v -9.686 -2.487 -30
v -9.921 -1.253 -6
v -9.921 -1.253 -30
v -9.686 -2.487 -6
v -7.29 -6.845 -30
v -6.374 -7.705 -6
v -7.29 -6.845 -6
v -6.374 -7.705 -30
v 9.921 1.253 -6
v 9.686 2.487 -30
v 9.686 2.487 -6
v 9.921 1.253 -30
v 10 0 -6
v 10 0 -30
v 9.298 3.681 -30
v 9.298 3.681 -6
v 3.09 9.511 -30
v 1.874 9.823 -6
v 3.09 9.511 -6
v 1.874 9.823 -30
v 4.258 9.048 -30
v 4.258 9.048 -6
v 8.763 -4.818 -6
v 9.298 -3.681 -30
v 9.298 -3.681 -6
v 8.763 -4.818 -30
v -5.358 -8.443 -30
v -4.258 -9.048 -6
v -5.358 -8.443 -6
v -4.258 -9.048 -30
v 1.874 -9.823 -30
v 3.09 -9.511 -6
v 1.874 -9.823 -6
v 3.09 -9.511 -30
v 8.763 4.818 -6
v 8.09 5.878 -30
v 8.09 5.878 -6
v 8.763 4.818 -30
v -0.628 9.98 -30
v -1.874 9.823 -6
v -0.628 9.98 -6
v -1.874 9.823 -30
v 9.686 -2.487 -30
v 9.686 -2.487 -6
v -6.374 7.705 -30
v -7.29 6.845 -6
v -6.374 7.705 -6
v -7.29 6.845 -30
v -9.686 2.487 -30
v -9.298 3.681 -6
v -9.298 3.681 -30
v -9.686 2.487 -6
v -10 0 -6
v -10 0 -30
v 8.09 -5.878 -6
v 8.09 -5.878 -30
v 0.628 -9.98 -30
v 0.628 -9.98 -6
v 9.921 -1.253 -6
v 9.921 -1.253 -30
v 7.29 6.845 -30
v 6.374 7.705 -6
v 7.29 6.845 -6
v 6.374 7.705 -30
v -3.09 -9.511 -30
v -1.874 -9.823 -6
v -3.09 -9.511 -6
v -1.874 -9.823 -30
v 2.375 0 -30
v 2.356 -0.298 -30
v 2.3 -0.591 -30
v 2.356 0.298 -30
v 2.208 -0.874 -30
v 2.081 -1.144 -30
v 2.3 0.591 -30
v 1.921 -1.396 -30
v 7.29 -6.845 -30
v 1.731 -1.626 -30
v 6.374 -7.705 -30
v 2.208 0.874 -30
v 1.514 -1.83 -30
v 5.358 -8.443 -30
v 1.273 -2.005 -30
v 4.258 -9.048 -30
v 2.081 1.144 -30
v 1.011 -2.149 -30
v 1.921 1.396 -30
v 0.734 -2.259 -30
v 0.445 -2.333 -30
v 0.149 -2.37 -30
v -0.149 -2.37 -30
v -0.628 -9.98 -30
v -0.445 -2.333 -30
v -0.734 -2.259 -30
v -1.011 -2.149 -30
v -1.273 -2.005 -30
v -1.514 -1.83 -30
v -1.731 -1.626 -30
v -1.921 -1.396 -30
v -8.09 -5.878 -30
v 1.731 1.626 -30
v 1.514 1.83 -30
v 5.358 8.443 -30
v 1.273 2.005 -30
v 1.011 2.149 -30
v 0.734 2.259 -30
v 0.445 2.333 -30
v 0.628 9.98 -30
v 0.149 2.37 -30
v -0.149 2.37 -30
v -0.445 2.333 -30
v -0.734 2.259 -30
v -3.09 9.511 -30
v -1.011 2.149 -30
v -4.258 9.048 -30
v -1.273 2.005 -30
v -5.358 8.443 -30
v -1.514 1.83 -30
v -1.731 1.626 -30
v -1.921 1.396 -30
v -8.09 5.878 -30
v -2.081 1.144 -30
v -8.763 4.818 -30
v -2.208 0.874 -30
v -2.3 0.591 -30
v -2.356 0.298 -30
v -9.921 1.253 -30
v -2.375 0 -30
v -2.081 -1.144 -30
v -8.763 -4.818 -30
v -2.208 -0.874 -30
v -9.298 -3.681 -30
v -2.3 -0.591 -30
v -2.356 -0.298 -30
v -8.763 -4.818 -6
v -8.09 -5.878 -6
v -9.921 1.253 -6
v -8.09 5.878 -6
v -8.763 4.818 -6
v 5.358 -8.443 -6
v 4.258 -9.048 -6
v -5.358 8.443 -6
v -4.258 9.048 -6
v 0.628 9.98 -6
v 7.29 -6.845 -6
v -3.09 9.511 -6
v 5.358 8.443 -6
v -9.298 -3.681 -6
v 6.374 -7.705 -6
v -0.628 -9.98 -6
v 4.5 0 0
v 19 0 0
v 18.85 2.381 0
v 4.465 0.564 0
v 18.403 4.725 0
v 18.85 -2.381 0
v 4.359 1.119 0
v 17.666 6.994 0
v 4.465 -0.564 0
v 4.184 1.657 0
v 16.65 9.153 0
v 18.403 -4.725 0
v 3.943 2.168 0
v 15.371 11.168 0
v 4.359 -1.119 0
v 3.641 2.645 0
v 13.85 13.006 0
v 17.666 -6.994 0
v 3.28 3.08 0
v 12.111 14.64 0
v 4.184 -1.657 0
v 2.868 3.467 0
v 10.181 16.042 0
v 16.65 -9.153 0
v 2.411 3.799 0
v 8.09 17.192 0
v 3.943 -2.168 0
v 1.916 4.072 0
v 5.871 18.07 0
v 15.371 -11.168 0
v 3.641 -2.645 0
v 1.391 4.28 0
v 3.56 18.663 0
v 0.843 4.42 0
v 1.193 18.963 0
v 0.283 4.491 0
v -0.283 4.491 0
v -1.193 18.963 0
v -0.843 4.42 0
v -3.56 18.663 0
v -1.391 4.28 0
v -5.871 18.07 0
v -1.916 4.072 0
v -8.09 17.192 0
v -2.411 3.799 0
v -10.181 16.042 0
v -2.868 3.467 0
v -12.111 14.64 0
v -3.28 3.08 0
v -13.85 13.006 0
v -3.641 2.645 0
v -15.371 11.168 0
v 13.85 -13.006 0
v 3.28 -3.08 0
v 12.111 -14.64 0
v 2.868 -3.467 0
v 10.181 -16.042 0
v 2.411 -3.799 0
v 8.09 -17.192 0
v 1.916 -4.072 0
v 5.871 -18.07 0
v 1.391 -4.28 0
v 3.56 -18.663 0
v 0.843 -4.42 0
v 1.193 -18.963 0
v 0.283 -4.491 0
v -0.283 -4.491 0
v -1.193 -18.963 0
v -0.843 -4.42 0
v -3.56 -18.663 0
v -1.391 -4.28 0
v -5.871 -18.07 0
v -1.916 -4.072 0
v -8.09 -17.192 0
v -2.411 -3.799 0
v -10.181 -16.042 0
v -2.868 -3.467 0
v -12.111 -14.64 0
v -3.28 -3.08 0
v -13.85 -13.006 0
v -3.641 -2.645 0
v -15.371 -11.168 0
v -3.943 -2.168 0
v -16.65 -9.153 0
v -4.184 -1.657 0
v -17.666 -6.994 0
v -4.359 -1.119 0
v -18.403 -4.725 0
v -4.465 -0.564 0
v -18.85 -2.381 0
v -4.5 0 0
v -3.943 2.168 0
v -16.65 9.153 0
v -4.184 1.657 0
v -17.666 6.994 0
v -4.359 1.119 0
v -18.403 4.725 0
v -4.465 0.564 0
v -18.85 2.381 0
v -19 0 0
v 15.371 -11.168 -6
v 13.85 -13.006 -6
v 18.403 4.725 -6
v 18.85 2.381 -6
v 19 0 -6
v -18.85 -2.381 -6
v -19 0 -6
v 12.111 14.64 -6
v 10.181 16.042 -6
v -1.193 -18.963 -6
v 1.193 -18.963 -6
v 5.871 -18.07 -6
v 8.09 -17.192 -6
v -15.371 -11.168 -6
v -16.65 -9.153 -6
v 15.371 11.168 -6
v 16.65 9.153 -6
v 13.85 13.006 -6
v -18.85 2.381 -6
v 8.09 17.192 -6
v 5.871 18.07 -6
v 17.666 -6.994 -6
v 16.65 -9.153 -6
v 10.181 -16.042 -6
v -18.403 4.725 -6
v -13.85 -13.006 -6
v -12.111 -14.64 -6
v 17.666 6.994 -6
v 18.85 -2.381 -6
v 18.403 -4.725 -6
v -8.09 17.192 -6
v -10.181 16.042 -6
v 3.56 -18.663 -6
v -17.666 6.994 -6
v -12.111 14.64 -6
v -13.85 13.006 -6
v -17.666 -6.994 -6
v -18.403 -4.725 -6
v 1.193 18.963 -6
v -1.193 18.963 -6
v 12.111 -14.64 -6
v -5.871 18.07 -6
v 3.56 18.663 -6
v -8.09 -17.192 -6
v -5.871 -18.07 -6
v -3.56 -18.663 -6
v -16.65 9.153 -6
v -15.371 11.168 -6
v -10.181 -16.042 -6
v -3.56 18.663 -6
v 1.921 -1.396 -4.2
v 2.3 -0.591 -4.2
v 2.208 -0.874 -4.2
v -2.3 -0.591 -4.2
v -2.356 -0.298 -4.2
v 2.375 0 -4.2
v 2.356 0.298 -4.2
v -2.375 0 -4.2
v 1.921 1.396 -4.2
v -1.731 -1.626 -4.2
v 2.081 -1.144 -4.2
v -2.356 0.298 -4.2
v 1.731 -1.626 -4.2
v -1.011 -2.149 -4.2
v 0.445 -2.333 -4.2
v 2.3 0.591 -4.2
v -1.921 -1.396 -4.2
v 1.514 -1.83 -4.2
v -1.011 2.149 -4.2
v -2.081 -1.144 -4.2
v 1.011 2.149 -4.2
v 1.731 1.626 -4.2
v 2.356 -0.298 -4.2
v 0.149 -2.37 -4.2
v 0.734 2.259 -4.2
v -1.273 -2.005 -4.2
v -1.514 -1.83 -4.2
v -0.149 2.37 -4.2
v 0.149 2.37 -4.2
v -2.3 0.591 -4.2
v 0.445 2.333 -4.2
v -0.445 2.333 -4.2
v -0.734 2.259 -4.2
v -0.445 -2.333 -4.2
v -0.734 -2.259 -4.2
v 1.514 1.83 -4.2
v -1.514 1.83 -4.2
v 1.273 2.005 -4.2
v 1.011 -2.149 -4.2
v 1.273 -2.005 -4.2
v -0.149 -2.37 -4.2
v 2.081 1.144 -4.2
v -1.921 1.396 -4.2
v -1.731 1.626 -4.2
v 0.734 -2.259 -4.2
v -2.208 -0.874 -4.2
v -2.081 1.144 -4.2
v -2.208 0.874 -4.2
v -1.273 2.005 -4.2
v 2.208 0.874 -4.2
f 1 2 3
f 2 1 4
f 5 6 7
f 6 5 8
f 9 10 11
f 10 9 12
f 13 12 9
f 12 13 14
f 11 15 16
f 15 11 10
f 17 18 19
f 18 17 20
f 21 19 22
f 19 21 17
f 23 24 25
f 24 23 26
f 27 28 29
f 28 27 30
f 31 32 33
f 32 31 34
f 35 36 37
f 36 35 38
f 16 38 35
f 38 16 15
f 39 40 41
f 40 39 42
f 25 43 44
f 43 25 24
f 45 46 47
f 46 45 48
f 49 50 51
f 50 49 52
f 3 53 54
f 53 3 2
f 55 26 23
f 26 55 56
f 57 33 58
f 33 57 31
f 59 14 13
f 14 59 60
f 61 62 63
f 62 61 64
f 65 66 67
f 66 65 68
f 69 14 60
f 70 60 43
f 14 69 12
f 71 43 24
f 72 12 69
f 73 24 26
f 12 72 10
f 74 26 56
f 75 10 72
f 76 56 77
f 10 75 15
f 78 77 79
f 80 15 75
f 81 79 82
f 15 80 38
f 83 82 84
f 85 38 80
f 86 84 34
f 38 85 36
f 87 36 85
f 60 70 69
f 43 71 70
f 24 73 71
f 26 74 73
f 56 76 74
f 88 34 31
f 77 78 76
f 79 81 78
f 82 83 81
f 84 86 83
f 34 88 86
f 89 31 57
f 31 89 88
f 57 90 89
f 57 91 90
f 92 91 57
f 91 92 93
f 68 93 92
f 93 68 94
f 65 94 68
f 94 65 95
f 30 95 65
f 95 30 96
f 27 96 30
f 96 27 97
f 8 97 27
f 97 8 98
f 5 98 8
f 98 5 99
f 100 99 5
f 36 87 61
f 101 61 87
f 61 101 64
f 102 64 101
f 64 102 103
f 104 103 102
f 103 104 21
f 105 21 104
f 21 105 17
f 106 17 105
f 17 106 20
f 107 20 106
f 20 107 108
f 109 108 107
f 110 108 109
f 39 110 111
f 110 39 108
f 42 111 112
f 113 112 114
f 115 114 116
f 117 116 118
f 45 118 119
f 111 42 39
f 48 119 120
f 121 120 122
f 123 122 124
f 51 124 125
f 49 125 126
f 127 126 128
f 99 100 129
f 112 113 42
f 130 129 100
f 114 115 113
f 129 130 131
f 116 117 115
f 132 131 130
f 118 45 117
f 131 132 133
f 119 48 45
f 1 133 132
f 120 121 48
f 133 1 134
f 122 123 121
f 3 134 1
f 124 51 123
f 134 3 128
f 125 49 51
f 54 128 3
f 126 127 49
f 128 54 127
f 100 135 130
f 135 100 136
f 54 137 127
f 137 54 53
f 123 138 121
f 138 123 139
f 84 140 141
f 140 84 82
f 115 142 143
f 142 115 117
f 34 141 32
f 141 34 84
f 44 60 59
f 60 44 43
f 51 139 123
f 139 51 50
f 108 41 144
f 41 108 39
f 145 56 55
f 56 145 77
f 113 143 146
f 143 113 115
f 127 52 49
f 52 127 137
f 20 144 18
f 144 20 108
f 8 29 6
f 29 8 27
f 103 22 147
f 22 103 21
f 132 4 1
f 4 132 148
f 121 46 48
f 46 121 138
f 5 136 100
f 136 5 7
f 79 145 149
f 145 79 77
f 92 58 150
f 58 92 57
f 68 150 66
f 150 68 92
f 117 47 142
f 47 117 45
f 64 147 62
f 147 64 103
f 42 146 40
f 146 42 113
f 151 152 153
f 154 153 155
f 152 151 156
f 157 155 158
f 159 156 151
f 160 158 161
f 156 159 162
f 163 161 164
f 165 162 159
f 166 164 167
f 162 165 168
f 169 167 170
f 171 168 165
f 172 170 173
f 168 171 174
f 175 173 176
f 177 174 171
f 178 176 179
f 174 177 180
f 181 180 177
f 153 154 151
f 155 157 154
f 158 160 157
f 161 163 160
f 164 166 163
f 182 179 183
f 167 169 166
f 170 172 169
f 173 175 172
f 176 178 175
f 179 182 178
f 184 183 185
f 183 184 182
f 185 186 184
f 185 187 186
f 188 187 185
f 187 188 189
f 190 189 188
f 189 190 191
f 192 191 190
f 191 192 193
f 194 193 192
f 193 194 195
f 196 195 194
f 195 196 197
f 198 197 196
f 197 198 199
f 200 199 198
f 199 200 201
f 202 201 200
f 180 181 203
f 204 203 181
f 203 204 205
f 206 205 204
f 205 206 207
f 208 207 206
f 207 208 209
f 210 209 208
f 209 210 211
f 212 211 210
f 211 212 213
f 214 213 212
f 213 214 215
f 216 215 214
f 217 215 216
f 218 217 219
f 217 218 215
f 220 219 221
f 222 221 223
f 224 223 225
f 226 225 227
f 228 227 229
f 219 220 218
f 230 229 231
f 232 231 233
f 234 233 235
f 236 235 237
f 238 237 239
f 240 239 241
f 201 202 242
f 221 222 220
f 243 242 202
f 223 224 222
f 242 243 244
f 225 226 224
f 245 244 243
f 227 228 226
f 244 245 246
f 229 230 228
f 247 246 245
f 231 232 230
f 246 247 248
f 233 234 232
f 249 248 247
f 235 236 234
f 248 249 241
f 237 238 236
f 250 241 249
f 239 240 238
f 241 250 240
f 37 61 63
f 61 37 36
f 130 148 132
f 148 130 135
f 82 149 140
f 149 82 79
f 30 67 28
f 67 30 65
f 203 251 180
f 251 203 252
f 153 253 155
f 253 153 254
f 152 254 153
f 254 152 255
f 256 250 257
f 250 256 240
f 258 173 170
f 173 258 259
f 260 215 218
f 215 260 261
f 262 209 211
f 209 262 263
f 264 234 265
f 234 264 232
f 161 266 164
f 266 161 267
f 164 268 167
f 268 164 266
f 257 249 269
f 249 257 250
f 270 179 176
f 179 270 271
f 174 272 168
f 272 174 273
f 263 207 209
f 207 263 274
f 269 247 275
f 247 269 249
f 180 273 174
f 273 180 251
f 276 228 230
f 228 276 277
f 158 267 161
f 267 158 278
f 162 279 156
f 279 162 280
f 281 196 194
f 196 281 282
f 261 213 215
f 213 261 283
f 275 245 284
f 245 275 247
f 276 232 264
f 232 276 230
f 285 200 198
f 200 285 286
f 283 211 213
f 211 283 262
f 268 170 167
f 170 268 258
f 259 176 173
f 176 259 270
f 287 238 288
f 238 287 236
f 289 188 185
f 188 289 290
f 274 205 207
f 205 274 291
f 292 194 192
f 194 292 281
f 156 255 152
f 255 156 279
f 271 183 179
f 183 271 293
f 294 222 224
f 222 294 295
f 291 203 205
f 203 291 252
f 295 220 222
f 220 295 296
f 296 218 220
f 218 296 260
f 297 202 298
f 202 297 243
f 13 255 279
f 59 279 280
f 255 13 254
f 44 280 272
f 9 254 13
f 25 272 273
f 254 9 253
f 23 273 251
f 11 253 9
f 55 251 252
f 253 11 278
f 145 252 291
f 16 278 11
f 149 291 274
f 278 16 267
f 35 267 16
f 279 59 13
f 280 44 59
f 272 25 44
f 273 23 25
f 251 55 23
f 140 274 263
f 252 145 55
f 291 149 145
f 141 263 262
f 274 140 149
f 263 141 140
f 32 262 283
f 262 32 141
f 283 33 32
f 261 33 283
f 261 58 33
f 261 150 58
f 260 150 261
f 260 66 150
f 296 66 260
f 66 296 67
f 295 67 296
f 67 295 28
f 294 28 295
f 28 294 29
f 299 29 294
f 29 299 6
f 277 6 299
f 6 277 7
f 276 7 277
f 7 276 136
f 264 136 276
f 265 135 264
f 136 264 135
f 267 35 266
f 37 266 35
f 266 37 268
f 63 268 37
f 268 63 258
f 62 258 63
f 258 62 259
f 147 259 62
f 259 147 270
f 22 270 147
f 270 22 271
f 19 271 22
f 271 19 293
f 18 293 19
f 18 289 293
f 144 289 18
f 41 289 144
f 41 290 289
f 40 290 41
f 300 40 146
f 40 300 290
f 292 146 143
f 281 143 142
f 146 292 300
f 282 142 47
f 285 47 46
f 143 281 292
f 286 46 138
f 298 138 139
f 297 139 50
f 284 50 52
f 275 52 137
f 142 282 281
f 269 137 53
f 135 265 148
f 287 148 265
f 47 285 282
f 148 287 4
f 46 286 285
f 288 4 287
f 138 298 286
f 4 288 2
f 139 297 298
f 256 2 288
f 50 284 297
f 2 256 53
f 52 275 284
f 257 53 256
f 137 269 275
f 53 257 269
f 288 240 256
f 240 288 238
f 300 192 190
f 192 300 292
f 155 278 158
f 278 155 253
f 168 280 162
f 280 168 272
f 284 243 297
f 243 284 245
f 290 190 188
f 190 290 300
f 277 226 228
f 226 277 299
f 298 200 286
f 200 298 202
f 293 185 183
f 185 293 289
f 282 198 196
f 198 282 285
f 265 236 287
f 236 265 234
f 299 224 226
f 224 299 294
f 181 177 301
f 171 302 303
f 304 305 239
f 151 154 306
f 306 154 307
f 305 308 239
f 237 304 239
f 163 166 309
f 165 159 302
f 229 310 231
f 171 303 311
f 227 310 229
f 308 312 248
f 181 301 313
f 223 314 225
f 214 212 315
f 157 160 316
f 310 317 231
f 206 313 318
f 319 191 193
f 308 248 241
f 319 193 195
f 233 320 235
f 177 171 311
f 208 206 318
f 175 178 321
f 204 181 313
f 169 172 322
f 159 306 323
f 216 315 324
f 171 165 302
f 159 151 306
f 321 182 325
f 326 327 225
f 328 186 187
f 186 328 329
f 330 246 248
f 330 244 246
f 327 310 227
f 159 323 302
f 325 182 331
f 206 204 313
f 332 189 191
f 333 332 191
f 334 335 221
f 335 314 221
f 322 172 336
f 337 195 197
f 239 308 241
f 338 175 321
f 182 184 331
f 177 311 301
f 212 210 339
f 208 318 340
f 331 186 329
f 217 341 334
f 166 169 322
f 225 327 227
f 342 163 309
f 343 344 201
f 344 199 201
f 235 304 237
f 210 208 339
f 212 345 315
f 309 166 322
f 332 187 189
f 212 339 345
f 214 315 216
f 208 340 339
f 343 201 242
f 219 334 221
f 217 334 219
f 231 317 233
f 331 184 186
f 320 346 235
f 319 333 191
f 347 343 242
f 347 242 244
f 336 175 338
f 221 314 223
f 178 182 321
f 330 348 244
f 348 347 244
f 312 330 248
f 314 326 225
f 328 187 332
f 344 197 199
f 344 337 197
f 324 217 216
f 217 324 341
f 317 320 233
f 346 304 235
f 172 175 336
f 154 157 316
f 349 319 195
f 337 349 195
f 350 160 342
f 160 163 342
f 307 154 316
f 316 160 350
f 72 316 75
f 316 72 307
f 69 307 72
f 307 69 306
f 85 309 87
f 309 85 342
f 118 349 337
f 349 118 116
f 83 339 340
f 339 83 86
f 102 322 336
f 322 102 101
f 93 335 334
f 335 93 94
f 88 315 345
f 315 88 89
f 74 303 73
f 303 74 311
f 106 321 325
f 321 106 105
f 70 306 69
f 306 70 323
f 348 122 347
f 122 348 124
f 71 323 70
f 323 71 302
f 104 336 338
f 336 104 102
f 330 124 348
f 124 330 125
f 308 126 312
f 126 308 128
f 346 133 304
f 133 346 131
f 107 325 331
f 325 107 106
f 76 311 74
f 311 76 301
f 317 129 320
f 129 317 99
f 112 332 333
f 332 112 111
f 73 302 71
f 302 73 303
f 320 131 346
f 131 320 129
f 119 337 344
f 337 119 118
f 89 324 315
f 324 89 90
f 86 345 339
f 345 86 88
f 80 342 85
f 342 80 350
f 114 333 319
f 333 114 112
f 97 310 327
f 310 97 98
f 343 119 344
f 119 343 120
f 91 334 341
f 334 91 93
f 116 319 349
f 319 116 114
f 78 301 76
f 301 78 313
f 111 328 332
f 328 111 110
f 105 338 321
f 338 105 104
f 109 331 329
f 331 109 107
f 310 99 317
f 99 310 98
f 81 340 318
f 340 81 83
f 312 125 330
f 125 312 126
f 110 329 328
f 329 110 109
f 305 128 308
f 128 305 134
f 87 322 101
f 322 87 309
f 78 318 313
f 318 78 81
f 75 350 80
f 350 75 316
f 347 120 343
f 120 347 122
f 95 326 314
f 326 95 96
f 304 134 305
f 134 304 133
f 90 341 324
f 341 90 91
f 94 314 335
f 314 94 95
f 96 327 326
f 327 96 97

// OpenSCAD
$fn = 50;


difference() {
	union() {
		translate(v = [0, 0, -30.0000000000]) {
			cylinder(h = 30, r = 10.0000000000);
		}
		translate(v = [0, 0, -6.0000000000]) {
			cylinder(h = 6, r = 19.0000000000);
		}
	}
	union() {
		translate(v = [0, 0, 0]) {
			rotate(a = [0, 0, 0]) {
				difference() {
					union() {
						#translate(v = [0, 0, -30.0000000000]) {
							cylinder(h = 30, r = 2.2500000000);
						}
						#translate(v = [0, 0, -4.2000000000]) {
							cylinder(h = 4.2000000000, r = 10.0000000000, r1 = 2.3750000000, r2 = 4.5000000000);
						}
						#translate(v = [0, 0, -30.0000000000]) {
							cylinder(h = 30, r = 2.3750000000);
						}
						#translate(v = [0, 0, -30.0000000000]) {
							cylinder(h = 30, r = 2.2500000000);
						}
					}
					union();
				}
			}
		}
	}
}
